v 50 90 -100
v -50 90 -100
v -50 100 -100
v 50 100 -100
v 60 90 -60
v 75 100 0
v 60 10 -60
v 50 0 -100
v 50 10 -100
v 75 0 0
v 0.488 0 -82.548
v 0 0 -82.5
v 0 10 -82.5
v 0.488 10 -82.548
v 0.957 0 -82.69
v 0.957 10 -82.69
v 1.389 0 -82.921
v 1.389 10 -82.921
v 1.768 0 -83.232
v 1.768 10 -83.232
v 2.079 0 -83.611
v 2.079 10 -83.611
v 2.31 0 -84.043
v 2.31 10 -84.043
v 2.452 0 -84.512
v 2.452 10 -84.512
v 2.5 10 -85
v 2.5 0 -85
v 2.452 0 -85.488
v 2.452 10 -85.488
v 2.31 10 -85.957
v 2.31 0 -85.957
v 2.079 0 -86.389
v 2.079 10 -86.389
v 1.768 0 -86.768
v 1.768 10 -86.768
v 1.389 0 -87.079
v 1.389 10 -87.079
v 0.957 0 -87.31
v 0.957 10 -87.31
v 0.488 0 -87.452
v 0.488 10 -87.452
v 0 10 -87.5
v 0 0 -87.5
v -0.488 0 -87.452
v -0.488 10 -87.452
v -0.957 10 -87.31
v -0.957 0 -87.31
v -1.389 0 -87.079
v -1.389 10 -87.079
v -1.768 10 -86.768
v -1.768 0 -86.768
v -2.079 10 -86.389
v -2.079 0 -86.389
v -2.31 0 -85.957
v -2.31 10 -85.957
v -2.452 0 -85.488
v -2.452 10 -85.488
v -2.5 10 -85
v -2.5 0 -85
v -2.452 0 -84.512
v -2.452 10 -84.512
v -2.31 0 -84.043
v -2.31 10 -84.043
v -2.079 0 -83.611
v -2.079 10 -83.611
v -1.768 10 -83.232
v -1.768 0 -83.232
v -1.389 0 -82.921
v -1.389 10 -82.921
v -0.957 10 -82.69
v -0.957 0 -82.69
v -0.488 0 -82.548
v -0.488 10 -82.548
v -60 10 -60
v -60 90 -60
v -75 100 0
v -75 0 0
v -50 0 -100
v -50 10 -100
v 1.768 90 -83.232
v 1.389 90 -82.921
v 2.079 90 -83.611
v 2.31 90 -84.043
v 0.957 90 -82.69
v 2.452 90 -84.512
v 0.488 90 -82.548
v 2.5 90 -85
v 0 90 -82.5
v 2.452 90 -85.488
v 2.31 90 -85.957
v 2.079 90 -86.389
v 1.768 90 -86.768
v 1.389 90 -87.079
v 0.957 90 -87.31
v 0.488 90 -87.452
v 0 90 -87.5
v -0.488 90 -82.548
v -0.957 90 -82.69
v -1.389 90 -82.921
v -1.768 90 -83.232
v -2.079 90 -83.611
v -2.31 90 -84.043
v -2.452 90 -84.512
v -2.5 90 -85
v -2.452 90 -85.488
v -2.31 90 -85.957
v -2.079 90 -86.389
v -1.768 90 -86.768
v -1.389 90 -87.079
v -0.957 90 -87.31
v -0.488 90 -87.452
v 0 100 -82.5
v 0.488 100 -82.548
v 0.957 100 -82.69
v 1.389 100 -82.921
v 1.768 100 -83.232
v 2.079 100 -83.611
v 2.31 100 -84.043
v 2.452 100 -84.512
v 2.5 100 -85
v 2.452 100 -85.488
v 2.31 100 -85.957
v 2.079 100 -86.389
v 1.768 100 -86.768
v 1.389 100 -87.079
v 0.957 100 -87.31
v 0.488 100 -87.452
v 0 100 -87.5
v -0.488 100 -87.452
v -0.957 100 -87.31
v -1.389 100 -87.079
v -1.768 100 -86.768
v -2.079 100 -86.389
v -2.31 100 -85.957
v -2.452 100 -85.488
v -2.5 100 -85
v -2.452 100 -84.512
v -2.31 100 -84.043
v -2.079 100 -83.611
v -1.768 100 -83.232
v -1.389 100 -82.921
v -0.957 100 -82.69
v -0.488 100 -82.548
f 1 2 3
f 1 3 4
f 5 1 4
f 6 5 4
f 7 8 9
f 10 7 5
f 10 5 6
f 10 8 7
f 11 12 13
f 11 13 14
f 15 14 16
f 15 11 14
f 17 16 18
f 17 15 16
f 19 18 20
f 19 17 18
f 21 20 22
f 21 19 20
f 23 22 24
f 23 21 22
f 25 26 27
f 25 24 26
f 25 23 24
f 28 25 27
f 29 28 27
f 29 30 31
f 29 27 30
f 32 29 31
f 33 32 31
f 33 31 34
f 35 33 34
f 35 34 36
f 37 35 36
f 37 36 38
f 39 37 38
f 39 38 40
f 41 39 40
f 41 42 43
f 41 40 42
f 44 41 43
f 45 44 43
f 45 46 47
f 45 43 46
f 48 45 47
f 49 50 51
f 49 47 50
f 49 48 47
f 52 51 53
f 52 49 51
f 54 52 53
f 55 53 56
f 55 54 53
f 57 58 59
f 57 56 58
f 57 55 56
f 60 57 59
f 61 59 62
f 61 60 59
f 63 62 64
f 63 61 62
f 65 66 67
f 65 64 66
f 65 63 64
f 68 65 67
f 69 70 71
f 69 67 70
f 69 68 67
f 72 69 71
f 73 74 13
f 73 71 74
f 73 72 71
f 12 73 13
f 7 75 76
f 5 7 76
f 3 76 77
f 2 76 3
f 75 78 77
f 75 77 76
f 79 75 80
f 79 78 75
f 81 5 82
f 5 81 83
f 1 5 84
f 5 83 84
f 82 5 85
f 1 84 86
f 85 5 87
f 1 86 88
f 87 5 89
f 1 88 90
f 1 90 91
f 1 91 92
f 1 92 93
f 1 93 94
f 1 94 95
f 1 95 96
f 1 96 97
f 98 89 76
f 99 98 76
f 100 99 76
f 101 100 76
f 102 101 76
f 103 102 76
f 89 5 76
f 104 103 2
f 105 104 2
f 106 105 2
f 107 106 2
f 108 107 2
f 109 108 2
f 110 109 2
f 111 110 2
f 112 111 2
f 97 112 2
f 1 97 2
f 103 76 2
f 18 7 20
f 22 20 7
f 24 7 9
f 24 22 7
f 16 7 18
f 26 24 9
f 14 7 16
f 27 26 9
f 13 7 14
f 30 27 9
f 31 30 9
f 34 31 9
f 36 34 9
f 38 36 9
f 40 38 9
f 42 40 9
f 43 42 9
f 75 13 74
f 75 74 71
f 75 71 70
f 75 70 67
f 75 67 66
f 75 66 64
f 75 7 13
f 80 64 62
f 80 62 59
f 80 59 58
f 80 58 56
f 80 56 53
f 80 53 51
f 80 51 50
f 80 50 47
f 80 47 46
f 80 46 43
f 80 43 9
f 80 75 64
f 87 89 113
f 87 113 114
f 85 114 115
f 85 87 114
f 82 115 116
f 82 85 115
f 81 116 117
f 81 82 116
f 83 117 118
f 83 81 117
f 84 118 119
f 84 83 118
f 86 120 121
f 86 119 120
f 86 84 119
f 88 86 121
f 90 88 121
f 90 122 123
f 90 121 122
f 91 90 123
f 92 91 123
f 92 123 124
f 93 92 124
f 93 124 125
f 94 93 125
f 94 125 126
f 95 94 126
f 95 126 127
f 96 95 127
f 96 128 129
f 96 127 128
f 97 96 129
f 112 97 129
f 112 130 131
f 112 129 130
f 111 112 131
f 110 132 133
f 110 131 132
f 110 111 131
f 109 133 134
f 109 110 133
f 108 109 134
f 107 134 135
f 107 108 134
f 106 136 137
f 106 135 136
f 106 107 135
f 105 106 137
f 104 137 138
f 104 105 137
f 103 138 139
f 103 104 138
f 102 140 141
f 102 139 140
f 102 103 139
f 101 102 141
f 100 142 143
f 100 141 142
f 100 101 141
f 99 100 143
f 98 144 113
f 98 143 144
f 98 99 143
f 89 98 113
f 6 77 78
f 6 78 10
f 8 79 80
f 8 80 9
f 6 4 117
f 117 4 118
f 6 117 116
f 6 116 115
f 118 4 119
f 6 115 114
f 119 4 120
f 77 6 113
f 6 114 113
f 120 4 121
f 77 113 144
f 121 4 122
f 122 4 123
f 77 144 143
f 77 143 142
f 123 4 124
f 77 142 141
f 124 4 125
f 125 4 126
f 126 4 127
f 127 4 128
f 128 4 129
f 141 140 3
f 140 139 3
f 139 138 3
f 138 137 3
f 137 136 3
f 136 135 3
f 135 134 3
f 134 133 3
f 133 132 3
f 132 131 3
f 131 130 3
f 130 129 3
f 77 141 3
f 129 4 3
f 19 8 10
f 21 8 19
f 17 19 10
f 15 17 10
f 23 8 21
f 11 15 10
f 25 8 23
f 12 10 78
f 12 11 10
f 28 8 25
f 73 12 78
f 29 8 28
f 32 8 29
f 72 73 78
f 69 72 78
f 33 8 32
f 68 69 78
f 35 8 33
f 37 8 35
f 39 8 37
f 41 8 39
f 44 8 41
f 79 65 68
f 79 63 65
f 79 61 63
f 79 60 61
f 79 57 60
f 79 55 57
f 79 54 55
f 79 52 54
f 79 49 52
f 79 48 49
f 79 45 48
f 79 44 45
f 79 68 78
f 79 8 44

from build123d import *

# Parameters (mm, degrees)
EXTRUDE_1_DEPTH          = 100
CUT_EXTRUDE_2_DEPTH      = 174.205080757
CUT_EXTRUDE_2_DEPTH_BACK = 174.205080757
SKETCH_2_W               = 40
SKETCH_2_H               = 80
CUT_EXTRUDE_3_DEPTH      = 174.205080757
CUT_EXTRUDE_3_DEPTH_BACK = 174.205080757
SKETCH_3_R               = 2.5
CUT_EXTRUDE_4_DEPTH      = 174.205080757


with BuildPart() as part:
    # 草图1 → 凸台-拉伸1 (new body)
    with BuildSketch(Plane(origin=(0, 0, 0), x_dir=(1, 0, 0), z_dir=(0, 1, 0))):
        Polygon((-50, 100), (50, 100), (100, -100), (-100, -100), align=None)
    extrude(amount=EXTRUDE_1_DEPTH)

    # 草图2 → 切除-拉伸2 (cut, two sides: drawn at the far end of the back side and taken through both)
    with BuildSketch(Plane(origin=(0, 0, 0), x_dir=(0, 0, -1), z_dir=(1, 0, 0)).offset(-CUT_EXTRUDE_2_DEPTH_BACK)):
        with Locations((80, 50)):
            Rectangle(SKETCH_2_W, SKETCH_2_H)
    extrude(amount=CUT_EXTRUDE_2_DEPTH + CUT_EXTRUDE_2_DEPTH_BACK, mode=Mode.SUBTRACT)

    # 草图3 → 切除-拉伸3 (cut, two sides: drawn at the far end of the back side and taken through both)
    with BuildSketch(Plane(origin=(0, 100, 0), x_dir=(1, 0, 0), z_dir=(0, 1, 0)).offset(-CUT_EXTRUDE_3_DEPTH_BACK)):
        with Locations(Location((0, 85, 0), (0, 0, 270))):
            Circle(SKETCH_3_R)
    extrude(amount=CUT_EXTRUDE_3_DEPTH + CUT_EXTRUDE_3_DEPTH_BACK, mode=Mode.SUBTRACT)

    # 草图4 → 切除-拉伸4 (cut, through all)
    with BuildSketch(Plane(origin=(0, 100, 0), x_dir=(1, 0, 0), z_dir=(0, 1, 0))):
        Polygon((-75, 0), (75, 0), (100, -100), (-100, -100), align=None)
    extrude(amount=-CUT_EXTRUDE_4_DEPTH, mode=Mode.SUBTRACT)


solid = part.part
